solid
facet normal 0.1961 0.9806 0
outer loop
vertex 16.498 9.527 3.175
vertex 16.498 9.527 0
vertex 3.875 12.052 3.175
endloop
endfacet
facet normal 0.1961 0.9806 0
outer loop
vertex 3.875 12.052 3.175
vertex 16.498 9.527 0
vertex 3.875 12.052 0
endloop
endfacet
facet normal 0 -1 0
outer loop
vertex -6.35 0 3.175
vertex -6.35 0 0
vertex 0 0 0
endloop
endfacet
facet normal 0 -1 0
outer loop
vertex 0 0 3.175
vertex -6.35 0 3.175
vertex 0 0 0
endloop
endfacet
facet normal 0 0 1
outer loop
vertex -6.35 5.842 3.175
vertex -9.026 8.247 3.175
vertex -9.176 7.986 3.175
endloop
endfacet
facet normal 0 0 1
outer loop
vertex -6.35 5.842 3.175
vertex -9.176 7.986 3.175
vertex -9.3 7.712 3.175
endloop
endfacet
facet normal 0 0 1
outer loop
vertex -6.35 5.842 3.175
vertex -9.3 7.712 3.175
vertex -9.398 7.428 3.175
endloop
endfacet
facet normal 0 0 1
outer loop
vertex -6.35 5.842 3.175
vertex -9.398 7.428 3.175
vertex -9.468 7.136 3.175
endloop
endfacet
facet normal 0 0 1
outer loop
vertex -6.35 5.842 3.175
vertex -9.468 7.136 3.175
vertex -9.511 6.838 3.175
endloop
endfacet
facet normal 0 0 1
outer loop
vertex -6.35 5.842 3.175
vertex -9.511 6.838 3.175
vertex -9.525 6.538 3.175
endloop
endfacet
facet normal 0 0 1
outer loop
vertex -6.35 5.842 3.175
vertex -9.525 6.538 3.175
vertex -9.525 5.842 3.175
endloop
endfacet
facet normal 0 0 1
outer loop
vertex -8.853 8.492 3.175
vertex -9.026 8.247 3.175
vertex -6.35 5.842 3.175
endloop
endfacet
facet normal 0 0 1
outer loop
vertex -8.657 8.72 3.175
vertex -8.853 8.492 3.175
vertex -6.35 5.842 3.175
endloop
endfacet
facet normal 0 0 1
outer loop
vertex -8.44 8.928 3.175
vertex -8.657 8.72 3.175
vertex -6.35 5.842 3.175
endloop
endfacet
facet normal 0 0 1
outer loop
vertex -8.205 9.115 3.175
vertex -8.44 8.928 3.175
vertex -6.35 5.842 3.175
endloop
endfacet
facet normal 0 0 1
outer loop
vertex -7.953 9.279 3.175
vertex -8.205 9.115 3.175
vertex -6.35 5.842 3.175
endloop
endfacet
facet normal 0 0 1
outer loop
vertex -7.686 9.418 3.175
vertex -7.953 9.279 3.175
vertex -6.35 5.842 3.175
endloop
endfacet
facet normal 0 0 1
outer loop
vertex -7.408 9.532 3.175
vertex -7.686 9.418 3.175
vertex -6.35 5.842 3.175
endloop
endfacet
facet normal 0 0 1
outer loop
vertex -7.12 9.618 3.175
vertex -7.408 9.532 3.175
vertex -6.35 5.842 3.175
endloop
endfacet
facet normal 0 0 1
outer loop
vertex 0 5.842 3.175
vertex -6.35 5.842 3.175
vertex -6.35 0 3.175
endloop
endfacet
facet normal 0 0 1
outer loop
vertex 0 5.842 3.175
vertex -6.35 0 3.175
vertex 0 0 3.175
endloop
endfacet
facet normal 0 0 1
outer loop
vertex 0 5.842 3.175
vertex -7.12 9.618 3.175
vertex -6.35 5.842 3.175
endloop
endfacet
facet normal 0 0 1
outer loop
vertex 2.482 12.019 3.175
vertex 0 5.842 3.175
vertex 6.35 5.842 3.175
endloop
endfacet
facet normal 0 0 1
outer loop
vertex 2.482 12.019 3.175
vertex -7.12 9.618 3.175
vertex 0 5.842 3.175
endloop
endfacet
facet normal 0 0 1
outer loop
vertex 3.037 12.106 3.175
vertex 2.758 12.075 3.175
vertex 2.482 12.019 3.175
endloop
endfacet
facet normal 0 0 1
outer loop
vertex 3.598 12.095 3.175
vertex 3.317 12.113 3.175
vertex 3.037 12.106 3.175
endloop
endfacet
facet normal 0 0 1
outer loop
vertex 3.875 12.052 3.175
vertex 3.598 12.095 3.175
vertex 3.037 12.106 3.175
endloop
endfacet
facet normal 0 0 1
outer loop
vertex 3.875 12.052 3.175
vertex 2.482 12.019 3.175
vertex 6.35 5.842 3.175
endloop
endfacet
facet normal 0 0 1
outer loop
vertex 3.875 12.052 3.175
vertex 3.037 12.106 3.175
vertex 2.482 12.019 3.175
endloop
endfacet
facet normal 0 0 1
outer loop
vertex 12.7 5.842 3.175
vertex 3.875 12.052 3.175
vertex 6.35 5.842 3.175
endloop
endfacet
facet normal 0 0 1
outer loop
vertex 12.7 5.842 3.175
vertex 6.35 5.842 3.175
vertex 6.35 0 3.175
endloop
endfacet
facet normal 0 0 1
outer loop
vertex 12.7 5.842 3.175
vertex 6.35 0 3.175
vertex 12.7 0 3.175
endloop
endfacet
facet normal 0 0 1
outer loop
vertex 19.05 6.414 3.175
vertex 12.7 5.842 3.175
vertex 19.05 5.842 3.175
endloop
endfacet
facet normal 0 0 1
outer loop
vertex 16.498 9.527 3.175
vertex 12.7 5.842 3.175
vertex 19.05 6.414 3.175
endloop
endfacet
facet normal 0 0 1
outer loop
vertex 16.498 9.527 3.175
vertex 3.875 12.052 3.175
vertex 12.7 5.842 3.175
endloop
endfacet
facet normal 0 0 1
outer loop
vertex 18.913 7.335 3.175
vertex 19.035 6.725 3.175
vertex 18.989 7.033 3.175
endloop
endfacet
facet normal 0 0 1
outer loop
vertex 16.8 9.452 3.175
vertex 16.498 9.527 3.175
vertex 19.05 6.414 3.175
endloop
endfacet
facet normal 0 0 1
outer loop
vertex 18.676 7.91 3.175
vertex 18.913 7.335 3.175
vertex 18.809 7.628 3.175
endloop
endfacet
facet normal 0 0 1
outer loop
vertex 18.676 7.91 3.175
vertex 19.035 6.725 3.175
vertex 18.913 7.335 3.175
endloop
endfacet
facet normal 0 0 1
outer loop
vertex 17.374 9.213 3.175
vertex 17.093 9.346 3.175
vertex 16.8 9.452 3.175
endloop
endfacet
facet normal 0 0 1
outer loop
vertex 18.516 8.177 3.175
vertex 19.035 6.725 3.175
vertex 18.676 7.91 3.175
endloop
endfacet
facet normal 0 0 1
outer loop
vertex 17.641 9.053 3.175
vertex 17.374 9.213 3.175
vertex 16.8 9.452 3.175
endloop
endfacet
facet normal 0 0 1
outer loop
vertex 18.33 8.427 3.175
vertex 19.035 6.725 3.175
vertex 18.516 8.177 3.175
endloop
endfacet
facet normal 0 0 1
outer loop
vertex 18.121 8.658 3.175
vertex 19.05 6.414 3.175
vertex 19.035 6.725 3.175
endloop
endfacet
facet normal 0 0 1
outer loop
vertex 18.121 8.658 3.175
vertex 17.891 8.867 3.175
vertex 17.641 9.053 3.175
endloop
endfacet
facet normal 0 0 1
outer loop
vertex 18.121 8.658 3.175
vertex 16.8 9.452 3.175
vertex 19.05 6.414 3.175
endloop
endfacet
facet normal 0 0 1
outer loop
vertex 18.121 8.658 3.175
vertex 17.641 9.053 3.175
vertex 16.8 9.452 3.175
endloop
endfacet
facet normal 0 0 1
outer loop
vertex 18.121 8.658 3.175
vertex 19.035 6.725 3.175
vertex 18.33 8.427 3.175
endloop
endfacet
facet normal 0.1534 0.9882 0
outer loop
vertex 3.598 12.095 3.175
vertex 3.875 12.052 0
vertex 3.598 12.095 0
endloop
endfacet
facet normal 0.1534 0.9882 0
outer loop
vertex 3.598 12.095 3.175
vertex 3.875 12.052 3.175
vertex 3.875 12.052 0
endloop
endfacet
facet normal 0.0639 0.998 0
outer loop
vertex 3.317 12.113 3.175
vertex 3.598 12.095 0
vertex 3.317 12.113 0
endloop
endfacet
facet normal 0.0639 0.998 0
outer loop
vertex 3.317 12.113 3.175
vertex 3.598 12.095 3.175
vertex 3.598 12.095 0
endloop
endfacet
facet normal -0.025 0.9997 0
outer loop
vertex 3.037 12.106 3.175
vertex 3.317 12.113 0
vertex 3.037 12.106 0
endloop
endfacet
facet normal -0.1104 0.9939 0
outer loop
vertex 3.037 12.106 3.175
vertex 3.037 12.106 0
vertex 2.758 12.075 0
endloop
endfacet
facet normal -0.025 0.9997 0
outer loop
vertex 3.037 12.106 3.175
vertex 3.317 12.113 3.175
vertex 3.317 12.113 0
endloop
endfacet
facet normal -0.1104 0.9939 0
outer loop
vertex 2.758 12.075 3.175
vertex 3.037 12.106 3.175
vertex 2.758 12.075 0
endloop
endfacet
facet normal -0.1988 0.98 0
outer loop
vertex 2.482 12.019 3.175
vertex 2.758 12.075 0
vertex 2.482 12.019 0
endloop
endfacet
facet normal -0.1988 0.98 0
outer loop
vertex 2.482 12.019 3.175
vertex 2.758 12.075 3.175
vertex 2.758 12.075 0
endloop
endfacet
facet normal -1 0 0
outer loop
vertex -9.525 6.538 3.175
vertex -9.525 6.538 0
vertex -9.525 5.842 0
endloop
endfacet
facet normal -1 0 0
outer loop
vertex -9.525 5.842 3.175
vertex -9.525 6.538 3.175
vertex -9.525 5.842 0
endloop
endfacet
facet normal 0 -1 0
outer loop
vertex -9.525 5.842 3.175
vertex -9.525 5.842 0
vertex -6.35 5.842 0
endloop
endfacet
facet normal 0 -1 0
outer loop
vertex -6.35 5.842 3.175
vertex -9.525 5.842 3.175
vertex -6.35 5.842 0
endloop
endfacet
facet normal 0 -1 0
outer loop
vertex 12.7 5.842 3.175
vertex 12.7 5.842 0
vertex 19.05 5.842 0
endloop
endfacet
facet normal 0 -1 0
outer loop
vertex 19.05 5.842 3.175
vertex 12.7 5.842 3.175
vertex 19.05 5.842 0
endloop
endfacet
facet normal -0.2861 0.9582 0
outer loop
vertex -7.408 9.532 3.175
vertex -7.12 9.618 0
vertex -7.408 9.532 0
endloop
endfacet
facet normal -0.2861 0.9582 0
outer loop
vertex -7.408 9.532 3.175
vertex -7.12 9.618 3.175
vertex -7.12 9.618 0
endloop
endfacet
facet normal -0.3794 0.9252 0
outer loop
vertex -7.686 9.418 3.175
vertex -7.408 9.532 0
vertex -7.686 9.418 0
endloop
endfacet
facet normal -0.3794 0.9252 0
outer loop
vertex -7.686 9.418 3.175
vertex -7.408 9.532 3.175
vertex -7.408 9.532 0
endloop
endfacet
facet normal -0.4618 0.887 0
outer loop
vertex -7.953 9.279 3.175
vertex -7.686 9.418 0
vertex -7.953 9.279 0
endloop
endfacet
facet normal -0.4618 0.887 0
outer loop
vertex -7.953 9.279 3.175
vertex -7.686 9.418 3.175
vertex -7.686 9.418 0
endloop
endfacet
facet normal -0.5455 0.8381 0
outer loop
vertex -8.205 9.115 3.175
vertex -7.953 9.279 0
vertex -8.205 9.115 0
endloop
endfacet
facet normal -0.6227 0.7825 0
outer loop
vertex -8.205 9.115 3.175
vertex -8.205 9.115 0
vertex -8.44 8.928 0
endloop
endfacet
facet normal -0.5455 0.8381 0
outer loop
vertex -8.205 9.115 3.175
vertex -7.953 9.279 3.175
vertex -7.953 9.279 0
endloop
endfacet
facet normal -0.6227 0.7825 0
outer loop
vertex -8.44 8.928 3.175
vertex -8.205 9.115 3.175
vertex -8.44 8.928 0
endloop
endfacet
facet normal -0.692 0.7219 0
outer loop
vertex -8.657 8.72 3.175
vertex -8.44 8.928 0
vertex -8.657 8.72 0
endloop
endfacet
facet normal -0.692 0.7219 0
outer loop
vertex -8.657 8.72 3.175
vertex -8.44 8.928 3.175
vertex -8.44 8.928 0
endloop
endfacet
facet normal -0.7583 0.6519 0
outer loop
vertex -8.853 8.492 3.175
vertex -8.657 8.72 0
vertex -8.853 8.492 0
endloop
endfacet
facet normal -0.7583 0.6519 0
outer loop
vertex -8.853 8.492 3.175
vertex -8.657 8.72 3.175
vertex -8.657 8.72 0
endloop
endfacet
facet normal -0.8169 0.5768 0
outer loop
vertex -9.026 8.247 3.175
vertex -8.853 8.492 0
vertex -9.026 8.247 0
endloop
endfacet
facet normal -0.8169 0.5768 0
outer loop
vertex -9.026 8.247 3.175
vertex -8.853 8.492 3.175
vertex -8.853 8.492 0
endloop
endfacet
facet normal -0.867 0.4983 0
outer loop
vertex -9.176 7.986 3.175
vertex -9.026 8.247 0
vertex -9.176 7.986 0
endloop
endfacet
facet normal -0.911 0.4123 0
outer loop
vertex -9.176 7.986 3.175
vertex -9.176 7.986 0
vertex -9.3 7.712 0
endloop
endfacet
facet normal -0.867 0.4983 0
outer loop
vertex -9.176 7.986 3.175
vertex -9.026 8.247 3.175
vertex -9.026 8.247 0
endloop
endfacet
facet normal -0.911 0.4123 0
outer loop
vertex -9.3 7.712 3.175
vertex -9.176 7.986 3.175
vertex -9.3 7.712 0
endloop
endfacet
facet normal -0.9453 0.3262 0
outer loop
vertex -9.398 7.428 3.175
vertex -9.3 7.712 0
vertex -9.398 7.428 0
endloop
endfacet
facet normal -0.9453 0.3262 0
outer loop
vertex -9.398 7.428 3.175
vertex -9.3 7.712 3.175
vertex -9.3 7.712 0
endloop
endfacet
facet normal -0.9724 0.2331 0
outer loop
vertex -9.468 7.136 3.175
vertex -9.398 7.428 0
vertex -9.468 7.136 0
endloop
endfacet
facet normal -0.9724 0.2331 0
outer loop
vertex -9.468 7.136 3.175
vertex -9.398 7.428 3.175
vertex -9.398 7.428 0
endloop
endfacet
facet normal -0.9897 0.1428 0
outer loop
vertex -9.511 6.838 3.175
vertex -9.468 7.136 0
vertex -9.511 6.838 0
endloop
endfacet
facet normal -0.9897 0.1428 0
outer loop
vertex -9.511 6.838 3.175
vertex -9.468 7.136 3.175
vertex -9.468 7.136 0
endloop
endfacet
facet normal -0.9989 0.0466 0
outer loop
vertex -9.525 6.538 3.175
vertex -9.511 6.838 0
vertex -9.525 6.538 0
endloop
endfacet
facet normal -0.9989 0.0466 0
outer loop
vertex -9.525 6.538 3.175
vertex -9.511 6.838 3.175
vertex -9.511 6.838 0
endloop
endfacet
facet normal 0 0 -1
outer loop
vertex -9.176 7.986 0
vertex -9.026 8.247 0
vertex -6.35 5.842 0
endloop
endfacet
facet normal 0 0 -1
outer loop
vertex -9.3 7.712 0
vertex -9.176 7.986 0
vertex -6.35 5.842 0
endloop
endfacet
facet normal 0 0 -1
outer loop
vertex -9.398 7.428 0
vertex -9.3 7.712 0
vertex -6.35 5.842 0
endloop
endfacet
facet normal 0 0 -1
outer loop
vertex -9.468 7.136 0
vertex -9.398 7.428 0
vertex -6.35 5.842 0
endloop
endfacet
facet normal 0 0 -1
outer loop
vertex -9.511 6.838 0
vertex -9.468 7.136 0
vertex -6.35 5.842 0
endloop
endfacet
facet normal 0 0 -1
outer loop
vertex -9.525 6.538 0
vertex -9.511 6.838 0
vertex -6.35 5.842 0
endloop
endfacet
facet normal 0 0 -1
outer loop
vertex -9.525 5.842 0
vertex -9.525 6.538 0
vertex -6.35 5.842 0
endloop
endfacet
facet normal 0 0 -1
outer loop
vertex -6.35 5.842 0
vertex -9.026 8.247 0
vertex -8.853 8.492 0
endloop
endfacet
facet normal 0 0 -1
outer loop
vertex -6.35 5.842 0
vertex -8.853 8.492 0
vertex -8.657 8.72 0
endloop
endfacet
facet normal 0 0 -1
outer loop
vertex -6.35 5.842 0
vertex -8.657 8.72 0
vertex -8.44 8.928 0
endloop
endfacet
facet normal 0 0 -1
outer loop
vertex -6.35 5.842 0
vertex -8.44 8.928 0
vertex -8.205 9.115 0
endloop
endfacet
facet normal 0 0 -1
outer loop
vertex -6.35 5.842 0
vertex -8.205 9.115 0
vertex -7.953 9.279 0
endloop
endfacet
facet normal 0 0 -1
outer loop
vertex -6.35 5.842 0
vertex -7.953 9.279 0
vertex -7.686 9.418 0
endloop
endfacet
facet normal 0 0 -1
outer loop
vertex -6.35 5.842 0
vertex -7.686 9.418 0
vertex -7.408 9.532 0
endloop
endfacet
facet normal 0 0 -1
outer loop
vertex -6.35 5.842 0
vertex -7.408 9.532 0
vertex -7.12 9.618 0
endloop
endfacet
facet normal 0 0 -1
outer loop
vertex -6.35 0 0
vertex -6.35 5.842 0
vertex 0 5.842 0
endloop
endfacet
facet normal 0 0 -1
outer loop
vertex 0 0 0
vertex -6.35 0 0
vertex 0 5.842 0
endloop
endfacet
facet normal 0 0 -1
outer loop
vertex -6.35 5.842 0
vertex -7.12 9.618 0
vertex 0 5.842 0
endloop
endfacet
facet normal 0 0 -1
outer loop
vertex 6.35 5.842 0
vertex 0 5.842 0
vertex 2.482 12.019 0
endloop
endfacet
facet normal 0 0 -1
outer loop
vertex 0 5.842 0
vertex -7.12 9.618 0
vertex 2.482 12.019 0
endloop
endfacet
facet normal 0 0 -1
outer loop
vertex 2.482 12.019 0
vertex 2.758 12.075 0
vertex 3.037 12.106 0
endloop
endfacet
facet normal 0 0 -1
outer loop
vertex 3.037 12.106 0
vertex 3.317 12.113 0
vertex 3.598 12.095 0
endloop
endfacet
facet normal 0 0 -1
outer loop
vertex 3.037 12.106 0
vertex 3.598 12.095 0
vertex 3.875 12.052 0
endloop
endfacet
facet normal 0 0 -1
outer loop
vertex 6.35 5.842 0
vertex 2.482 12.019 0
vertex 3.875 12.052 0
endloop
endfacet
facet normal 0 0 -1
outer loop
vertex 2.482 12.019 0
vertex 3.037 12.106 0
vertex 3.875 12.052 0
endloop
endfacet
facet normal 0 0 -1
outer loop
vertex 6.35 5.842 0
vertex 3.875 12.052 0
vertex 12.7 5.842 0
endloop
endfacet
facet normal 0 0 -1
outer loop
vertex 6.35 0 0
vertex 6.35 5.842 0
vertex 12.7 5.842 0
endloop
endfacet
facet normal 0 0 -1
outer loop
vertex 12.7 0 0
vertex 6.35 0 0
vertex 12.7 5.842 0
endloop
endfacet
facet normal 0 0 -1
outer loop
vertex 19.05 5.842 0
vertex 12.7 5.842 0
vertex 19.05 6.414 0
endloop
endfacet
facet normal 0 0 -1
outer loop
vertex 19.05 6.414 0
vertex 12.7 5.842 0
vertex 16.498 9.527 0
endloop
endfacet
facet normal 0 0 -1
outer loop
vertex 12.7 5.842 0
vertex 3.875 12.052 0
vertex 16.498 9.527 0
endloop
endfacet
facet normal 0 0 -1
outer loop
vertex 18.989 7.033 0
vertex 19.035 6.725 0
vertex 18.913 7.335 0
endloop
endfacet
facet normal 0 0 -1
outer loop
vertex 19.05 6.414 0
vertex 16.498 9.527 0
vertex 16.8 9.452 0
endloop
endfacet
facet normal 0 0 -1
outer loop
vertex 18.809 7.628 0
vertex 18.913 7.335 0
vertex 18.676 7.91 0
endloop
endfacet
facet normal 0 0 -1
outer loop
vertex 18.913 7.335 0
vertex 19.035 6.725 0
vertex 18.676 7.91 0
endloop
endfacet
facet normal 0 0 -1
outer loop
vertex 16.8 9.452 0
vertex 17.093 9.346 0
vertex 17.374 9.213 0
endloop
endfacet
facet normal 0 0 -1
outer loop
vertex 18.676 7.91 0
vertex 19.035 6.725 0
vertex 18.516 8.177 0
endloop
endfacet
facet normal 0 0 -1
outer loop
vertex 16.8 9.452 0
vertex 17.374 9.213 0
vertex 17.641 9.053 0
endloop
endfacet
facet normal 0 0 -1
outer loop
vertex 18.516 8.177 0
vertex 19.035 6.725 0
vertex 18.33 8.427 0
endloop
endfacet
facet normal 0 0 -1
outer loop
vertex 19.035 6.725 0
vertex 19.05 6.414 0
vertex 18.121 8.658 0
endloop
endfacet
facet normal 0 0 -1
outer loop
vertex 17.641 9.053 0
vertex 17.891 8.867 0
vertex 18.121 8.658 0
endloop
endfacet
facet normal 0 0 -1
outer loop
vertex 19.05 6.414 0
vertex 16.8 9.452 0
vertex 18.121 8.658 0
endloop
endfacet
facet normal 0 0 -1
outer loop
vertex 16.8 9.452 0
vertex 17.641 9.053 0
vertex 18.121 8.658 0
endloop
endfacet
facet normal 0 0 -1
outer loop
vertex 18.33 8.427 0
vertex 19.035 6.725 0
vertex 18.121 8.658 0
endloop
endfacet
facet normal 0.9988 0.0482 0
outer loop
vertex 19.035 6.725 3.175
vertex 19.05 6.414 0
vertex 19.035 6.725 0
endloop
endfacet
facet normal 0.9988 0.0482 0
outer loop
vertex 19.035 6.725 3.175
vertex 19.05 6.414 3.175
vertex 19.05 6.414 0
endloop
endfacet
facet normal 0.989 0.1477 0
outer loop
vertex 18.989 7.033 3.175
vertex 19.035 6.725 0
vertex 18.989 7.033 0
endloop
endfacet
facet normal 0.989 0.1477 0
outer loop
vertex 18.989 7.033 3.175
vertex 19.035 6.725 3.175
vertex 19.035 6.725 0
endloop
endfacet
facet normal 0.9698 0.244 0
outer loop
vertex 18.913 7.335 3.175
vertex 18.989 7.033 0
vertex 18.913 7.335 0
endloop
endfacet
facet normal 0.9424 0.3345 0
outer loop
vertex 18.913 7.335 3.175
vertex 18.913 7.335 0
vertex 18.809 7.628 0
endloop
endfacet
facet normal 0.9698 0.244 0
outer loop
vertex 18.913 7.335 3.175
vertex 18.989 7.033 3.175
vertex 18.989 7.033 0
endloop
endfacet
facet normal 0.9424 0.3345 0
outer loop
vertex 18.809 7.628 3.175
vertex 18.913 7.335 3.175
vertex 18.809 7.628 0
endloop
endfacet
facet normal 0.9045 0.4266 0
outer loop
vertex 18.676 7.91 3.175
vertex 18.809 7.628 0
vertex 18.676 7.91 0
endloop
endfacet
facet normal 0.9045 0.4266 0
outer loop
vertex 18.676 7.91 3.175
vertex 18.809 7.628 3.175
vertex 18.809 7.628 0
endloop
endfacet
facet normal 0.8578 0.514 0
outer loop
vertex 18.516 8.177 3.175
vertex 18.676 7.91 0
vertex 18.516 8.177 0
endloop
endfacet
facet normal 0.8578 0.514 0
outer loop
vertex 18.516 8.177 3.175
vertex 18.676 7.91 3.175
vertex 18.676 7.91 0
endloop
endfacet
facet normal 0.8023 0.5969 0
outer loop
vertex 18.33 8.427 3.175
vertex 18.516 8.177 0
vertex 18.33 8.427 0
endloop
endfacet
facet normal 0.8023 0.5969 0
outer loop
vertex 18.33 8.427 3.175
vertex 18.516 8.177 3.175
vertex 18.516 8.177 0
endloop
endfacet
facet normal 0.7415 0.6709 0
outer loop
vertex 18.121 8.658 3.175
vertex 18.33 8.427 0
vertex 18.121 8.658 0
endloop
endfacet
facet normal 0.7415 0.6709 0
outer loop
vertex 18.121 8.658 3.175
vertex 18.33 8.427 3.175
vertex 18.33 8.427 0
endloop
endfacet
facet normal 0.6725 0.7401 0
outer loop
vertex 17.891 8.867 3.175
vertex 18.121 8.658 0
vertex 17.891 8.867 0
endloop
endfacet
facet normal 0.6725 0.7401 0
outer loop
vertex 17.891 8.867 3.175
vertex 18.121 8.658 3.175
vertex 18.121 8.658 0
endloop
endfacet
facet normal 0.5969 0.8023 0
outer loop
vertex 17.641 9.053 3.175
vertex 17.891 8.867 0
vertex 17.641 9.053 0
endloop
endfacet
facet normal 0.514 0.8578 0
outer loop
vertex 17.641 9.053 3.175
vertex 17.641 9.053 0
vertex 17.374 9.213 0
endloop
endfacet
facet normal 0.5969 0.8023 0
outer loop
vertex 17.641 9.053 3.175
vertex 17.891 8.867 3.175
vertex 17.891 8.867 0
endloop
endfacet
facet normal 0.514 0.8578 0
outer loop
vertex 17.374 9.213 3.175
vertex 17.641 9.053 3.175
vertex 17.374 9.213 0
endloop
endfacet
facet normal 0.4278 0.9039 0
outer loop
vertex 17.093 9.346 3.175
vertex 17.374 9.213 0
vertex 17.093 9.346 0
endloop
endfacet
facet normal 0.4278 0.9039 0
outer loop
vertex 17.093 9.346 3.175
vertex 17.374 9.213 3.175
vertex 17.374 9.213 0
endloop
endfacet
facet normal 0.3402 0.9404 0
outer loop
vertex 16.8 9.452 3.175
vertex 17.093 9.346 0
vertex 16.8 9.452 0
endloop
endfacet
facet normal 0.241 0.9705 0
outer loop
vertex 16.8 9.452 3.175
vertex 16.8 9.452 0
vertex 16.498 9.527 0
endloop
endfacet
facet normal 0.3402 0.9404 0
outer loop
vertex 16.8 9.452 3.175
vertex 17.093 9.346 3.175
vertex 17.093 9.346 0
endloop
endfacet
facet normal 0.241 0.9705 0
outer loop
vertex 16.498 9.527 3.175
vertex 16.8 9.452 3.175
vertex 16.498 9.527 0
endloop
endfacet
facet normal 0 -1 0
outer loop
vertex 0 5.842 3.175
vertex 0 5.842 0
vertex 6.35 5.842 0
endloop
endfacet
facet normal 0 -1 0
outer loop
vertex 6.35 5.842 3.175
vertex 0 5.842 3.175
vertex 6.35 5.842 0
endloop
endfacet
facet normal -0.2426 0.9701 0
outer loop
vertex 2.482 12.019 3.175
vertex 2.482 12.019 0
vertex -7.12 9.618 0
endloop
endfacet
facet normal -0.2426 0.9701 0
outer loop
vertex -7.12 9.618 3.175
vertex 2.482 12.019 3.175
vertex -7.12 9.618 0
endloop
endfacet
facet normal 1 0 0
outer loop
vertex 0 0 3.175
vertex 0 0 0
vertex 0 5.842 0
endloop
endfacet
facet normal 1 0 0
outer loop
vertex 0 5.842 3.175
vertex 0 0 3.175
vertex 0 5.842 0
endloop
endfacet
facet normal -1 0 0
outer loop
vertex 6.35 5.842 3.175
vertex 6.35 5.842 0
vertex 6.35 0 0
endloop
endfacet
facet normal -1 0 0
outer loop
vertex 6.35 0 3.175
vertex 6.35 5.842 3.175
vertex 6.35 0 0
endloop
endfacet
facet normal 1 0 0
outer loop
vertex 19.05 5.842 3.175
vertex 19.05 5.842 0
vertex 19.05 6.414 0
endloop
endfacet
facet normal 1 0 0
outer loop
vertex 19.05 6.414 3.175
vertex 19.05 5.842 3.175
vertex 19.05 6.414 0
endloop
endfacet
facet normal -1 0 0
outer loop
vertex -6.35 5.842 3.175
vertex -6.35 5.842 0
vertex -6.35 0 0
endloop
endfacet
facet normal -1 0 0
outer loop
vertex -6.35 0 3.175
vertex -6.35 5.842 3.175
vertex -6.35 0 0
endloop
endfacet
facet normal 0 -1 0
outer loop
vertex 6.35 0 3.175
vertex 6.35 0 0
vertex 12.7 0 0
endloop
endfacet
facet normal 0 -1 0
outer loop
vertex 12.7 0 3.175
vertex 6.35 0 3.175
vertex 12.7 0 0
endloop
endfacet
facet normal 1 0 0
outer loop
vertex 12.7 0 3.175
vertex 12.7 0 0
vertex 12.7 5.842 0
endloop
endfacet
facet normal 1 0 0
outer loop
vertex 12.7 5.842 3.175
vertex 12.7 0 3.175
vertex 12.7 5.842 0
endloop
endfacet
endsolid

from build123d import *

# Parameters (mm, degrees)
BOSS_EXTRUDE1_DEPTH = 3.175
FILLET1_R           = 3.175


with BuildPart() as part:
    # Sketch1 → Boss-Extrude1 (new body)
    with BuildSketch(Plane.XY):
        Polygon((0, 5.842), (6.35, 5.842), (6.35, 0), (12.7, 0), (12.7, 5.842), (19.05, 5.842), (19.05, 9.017), (3.175, 12.192), (-9.525, 9.017), (-9.525, 5.842), (-6.35, 5.842), (-6.35, 0), (0, 0), align=None)
    extrude(amount=BOSS_EXTRUDE1_DEPTH)

    # Fillet1
    fillet1_edges = [part.edges().sort_by_distance(p)[0] for p in [
        (-9.525, 9.017, 1.5875),
        (3.175, 12.192, 1.5875),
        (19.05, 9.017, 1.5875),
    ]]
    fillet(fillet1_edges, radius=FILLET1_R)


solid = part.part
